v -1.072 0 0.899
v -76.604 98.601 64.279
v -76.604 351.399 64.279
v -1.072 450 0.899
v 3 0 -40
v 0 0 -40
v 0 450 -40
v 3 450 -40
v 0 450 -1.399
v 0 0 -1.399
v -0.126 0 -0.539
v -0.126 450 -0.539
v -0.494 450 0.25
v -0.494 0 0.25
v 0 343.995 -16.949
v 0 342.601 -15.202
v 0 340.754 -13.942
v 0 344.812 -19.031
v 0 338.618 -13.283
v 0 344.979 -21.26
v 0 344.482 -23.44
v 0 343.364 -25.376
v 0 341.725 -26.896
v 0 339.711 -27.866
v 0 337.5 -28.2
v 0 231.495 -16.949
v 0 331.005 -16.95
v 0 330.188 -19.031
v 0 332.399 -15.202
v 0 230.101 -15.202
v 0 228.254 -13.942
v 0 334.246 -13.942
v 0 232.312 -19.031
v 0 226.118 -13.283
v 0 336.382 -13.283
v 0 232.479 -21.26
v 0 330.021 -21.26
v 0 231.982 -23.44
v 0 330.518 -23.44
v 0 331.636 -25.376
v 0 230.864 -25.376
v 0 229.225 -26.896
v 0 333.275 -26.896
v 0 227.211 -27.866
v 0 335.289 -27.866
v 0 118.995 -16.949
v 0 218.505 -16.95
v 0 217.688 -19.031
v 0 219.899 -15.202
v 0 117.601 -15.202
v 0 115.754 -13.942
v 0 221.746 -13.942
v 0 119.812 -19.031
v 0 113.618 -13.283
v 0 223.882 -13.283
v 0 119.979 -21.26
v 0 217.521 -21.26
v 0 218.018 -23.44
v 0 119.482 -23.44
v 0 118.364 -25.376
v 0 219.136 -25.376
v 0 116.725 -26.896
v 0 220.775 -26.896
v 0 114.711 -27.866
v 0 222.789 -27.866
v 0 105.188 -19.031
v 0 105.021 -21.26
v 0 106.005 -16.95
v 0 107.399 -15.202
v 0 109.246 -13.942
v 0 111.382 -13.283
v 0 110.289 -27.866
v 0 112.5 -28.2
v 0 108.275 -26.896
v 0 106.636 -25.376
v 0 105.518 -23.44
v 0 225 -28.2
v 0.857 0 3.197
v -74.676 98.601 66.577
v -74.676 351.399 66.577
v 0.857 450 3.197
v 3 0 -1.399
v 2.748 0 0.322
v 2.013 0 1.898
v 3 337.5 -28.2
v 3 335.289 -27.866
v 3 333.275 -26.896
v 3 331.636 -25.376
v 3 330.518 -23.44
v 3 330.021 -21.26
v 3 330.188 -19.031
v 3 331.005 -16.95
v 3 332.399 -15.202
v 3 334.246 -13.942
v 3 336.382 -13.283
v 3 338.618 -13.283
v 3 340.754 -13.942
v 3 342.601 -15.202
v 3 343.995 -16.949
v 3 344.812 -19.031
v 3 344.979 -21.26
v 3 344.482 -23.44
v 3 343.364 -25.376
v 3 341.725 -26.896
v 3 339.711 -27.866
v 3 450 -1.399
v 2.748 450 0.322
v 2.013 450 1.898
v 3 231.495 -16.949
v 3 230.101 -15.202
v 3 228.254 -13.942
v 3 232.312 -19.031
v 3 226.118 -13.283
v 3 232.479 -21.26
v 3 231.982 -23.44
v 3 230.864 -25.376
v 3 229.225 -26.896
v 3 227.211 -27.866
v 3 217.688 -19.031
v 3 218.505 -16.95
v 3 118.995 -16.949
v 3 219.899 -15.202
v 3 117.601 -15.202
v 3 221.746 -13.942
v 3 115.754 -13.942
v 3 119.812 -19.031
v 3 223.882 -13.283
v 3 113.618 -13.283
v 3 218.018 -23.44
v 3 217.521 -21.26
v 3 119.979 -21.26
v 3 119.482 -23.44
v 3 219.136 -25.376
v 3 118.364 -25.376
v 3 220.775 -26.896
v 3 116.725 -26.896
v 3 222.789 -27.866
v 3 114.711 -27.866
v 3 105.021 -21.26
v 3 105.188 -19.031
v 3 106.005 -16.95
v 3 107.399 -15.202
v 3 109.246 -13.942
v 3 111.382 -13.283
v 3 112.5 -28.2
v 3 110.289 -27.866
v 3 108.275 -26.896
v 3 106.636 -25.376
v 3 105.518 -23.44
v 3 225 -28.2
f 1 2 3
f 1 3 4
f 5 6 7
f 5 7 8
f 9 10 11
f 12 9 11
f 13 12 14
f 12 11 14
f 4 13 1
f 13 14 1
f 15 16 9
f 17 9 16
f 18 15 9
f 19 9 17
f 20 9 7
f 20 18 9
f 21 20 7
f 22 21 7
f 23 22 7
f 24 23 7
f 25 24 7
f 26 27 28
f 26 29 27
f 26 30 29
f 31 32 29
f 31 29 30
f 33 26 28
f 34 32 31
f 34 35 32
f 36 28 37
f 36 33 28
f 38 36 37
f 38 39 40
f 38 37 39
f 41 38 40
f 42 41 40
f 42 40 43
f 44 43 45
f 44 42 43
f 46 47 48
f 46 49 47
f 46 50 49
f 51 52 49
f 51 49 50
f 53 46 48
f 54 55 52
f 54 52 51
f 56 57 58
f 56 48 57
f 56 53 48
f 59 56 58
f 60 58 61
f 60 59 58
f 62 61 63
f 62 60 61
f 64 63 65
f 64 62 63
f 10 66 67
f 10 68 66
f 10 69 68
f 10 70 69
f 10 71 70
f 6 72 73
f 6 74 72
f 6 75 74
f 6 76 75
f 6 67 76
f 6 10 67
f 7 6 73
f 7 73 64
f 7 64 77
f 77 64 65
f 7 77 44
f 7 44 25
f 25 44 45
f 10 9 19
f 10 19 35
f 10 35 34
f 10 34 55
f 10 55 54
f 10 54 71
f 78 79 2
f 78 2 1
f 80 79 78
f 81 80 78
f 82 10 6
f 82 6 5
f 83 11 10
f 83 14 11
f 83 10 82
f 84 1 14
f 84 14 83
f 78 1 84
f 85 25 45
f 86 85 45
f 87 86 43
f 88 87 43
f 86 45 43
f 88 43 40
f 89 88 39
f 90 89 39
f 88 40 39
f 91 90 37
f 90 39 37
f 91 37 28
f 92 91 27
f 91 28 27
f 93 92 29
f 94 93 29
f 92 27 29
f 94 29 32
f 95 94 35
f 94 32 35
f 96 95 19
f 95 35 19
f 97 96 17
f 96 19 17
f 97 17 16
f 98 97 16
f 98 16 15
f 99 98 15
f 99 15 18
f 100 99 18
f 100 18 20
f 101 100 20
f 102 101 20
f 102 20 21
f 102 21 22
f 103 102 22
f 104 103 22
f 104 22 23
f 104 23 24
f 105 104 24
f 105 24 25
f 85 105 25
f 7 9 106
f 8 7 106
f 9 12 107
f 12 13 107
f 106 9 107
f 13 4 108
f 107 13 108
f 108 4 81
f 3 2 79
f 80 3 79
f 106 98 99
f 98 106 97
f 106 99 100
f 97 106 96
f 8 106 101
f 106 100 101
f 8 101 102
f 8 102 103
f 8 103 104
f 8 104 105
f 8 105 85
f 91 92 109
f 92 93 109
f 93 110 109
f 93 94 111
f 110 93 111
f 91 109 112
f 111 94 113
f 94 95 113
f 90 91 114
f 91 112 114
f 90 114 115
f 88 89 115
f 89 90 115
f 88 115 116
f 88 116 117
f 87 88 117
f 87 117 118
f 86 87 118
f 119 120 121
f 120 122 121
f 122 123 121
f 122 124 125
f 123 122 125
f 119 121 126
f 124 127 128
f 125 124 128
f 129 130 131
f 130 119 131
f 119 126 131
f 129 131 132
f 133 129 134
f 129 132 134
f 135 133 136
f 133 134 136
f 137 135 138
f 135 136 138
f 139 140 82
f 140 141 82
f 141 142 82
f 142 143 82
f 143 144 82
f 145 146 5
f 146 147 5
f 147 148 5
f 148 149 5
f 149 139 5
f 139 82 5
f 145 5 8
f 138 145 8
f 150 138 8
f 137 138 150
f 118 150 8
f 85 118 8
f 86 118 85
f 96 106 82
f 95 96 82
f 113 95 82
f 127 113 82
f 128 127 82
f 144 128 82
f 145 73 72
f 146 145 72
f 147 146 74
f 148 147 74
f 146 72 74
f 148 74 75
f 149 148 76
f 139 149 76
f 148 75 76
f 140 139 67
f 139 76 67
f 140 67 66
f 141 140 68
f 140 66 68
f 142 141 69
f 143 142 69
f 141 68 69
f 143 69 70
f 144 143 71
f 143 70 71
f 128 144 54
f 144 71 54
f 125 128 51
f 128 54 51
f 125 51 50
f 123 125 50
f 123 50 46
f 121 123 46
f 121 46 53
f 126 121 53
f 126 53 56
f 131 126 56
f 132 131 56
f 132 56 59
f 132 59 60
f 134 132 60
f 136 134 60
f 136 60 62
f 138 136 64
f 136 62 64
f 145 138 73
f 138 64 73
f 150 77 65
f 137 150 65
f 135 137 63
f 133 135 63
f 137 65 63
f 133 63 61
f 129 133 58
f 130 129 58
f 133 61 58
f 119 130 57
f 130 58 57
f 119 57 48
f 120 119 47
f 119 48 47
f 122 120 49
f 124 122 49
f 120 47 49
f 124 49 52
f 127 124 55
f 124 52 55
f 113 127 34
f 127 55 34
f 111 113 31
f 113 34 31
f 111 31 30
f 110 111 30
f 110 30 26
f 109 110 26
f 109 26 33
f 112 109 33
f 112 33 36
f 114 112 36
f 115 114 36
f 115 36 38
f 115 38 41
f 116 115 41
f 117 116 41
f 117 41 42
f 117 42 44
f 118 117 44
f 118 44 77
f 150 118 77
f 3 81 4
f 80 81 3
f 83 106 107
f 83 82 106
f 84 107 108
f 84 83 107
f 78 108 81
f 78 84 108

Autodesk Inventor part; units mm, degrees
ref_plane "YZ Plane" through (0, 0, 0) normal (1, 0, 0) x (0, 1, 0)
ref_plane "XZ Plane" through (0, 0, 0) normal (0, 1, 0) x (-1, 0, 0)
ref_plane "XY Plane" through (0, 0, 0) normal (0, 0, 1) x (1, 0, 0)
sketch "Sketch1" plane through (0, 0, 0) normal (0, 1, 0) x (-1, 0, 0)
  line L0 (76.6044, 64.2788) -> (0, 0)
  line L1 (0, 0) -> (0, -40)
  dimension "d0" = 40
  dimension "d1" = 100
  dimension "d12" = 50
contour flange "Contour Flange1" sketch "Sketch1" thickness 3 bend radius 3 width 450 along (0, 1, 0) mid plane no both sides no wall seen from (-38.3022, 0, 32.1394) lies toward (0.6427876, 0, 0.7660444) curves L0 L1
bend "Bend1"
corner "Corner1"
sketch "Sketch2" plane through (-74.6761, 0, 66.5769) normal (0.6427876, 0, 0.7660444) x (0.7660444, 0, -0.6427876)
  line L0 (98.6011, 450) -> (98.6011, 0) projected
  line L1 (0, 450) -> (98.6011, 450) projected
  line L2 (0, 0) -> (0, 450) projected
  line L3 (0, 0) -> (98.6011, 0) projected
  line L4 (98.6011, 450) -> (0, 351.3989)
  line L5 (0, 98.6011) -> (98.6011, 0)
  dimension "d13" = 45
  dimension "d14" = 45
extrude "Extrusion1" cut sketch "Sketch2" against normal blind 10 contours L4 L2 L1 | L3 L2 L5
sketch "Sketch4" plane through (3, 0, -40) normal (1, 0, 0) x (0, 0, -1)
  line L0 (-38.6011, 450) -> (-38.6011, 0) projected
  line L1 (-38.6011, 450) -> (0, 450) projected
  line L2 (-19.3005, 112.5) -> (-19.3005, 225)
  line L3 (-19.3005, 225) -> (-19.3005, 337.5)
  point P0 (-40, 0)
  point P1 (-38.6011, 225)
  point P2 (-19.3005, 450)
  dimension "d17" = 112.5
hole "Hole1" at (3, 337.5, -20.6995) at (3, 225, -20.6995) at (3, 112.5, -20.6995) direction (-1, 0, 0) diameter 15 end through all
equation "\"d23\" = Thickness"
equation "\"d2\" = BendReliefWidth"
equation "\"d3\" = BendReliefDepth"
equation "\"d4\" = MinimumRemnant"
equation "\"d5\" = BendRadius"
equation "\"d7\" = BendRadius"
equation "\"d9\" = CornerReliefSize"
equation "\"d10\" = GapSize"
equation "\"d11\" = JacobiRadiusSize"
equation "\"BendRadius\" = Thickness"
equation "\"BendReliefWidth\" = Thickness"
equation "\"BendReliefDepth\" = 0.5 * Thickness"
equation "\"CornerReliefSize\" = 4 * Thickness"
equation "\"MinimumRemnant\" = 2 * Thickness"
equation "\"TransitionRadius\" = BendRadius"
equation "\"JacobiRadiusSize\" = BendRadius"
equation "\"GapSize\" = Thickness"
equation "\"Thickness\" = 3"
properties part number "SH3"
